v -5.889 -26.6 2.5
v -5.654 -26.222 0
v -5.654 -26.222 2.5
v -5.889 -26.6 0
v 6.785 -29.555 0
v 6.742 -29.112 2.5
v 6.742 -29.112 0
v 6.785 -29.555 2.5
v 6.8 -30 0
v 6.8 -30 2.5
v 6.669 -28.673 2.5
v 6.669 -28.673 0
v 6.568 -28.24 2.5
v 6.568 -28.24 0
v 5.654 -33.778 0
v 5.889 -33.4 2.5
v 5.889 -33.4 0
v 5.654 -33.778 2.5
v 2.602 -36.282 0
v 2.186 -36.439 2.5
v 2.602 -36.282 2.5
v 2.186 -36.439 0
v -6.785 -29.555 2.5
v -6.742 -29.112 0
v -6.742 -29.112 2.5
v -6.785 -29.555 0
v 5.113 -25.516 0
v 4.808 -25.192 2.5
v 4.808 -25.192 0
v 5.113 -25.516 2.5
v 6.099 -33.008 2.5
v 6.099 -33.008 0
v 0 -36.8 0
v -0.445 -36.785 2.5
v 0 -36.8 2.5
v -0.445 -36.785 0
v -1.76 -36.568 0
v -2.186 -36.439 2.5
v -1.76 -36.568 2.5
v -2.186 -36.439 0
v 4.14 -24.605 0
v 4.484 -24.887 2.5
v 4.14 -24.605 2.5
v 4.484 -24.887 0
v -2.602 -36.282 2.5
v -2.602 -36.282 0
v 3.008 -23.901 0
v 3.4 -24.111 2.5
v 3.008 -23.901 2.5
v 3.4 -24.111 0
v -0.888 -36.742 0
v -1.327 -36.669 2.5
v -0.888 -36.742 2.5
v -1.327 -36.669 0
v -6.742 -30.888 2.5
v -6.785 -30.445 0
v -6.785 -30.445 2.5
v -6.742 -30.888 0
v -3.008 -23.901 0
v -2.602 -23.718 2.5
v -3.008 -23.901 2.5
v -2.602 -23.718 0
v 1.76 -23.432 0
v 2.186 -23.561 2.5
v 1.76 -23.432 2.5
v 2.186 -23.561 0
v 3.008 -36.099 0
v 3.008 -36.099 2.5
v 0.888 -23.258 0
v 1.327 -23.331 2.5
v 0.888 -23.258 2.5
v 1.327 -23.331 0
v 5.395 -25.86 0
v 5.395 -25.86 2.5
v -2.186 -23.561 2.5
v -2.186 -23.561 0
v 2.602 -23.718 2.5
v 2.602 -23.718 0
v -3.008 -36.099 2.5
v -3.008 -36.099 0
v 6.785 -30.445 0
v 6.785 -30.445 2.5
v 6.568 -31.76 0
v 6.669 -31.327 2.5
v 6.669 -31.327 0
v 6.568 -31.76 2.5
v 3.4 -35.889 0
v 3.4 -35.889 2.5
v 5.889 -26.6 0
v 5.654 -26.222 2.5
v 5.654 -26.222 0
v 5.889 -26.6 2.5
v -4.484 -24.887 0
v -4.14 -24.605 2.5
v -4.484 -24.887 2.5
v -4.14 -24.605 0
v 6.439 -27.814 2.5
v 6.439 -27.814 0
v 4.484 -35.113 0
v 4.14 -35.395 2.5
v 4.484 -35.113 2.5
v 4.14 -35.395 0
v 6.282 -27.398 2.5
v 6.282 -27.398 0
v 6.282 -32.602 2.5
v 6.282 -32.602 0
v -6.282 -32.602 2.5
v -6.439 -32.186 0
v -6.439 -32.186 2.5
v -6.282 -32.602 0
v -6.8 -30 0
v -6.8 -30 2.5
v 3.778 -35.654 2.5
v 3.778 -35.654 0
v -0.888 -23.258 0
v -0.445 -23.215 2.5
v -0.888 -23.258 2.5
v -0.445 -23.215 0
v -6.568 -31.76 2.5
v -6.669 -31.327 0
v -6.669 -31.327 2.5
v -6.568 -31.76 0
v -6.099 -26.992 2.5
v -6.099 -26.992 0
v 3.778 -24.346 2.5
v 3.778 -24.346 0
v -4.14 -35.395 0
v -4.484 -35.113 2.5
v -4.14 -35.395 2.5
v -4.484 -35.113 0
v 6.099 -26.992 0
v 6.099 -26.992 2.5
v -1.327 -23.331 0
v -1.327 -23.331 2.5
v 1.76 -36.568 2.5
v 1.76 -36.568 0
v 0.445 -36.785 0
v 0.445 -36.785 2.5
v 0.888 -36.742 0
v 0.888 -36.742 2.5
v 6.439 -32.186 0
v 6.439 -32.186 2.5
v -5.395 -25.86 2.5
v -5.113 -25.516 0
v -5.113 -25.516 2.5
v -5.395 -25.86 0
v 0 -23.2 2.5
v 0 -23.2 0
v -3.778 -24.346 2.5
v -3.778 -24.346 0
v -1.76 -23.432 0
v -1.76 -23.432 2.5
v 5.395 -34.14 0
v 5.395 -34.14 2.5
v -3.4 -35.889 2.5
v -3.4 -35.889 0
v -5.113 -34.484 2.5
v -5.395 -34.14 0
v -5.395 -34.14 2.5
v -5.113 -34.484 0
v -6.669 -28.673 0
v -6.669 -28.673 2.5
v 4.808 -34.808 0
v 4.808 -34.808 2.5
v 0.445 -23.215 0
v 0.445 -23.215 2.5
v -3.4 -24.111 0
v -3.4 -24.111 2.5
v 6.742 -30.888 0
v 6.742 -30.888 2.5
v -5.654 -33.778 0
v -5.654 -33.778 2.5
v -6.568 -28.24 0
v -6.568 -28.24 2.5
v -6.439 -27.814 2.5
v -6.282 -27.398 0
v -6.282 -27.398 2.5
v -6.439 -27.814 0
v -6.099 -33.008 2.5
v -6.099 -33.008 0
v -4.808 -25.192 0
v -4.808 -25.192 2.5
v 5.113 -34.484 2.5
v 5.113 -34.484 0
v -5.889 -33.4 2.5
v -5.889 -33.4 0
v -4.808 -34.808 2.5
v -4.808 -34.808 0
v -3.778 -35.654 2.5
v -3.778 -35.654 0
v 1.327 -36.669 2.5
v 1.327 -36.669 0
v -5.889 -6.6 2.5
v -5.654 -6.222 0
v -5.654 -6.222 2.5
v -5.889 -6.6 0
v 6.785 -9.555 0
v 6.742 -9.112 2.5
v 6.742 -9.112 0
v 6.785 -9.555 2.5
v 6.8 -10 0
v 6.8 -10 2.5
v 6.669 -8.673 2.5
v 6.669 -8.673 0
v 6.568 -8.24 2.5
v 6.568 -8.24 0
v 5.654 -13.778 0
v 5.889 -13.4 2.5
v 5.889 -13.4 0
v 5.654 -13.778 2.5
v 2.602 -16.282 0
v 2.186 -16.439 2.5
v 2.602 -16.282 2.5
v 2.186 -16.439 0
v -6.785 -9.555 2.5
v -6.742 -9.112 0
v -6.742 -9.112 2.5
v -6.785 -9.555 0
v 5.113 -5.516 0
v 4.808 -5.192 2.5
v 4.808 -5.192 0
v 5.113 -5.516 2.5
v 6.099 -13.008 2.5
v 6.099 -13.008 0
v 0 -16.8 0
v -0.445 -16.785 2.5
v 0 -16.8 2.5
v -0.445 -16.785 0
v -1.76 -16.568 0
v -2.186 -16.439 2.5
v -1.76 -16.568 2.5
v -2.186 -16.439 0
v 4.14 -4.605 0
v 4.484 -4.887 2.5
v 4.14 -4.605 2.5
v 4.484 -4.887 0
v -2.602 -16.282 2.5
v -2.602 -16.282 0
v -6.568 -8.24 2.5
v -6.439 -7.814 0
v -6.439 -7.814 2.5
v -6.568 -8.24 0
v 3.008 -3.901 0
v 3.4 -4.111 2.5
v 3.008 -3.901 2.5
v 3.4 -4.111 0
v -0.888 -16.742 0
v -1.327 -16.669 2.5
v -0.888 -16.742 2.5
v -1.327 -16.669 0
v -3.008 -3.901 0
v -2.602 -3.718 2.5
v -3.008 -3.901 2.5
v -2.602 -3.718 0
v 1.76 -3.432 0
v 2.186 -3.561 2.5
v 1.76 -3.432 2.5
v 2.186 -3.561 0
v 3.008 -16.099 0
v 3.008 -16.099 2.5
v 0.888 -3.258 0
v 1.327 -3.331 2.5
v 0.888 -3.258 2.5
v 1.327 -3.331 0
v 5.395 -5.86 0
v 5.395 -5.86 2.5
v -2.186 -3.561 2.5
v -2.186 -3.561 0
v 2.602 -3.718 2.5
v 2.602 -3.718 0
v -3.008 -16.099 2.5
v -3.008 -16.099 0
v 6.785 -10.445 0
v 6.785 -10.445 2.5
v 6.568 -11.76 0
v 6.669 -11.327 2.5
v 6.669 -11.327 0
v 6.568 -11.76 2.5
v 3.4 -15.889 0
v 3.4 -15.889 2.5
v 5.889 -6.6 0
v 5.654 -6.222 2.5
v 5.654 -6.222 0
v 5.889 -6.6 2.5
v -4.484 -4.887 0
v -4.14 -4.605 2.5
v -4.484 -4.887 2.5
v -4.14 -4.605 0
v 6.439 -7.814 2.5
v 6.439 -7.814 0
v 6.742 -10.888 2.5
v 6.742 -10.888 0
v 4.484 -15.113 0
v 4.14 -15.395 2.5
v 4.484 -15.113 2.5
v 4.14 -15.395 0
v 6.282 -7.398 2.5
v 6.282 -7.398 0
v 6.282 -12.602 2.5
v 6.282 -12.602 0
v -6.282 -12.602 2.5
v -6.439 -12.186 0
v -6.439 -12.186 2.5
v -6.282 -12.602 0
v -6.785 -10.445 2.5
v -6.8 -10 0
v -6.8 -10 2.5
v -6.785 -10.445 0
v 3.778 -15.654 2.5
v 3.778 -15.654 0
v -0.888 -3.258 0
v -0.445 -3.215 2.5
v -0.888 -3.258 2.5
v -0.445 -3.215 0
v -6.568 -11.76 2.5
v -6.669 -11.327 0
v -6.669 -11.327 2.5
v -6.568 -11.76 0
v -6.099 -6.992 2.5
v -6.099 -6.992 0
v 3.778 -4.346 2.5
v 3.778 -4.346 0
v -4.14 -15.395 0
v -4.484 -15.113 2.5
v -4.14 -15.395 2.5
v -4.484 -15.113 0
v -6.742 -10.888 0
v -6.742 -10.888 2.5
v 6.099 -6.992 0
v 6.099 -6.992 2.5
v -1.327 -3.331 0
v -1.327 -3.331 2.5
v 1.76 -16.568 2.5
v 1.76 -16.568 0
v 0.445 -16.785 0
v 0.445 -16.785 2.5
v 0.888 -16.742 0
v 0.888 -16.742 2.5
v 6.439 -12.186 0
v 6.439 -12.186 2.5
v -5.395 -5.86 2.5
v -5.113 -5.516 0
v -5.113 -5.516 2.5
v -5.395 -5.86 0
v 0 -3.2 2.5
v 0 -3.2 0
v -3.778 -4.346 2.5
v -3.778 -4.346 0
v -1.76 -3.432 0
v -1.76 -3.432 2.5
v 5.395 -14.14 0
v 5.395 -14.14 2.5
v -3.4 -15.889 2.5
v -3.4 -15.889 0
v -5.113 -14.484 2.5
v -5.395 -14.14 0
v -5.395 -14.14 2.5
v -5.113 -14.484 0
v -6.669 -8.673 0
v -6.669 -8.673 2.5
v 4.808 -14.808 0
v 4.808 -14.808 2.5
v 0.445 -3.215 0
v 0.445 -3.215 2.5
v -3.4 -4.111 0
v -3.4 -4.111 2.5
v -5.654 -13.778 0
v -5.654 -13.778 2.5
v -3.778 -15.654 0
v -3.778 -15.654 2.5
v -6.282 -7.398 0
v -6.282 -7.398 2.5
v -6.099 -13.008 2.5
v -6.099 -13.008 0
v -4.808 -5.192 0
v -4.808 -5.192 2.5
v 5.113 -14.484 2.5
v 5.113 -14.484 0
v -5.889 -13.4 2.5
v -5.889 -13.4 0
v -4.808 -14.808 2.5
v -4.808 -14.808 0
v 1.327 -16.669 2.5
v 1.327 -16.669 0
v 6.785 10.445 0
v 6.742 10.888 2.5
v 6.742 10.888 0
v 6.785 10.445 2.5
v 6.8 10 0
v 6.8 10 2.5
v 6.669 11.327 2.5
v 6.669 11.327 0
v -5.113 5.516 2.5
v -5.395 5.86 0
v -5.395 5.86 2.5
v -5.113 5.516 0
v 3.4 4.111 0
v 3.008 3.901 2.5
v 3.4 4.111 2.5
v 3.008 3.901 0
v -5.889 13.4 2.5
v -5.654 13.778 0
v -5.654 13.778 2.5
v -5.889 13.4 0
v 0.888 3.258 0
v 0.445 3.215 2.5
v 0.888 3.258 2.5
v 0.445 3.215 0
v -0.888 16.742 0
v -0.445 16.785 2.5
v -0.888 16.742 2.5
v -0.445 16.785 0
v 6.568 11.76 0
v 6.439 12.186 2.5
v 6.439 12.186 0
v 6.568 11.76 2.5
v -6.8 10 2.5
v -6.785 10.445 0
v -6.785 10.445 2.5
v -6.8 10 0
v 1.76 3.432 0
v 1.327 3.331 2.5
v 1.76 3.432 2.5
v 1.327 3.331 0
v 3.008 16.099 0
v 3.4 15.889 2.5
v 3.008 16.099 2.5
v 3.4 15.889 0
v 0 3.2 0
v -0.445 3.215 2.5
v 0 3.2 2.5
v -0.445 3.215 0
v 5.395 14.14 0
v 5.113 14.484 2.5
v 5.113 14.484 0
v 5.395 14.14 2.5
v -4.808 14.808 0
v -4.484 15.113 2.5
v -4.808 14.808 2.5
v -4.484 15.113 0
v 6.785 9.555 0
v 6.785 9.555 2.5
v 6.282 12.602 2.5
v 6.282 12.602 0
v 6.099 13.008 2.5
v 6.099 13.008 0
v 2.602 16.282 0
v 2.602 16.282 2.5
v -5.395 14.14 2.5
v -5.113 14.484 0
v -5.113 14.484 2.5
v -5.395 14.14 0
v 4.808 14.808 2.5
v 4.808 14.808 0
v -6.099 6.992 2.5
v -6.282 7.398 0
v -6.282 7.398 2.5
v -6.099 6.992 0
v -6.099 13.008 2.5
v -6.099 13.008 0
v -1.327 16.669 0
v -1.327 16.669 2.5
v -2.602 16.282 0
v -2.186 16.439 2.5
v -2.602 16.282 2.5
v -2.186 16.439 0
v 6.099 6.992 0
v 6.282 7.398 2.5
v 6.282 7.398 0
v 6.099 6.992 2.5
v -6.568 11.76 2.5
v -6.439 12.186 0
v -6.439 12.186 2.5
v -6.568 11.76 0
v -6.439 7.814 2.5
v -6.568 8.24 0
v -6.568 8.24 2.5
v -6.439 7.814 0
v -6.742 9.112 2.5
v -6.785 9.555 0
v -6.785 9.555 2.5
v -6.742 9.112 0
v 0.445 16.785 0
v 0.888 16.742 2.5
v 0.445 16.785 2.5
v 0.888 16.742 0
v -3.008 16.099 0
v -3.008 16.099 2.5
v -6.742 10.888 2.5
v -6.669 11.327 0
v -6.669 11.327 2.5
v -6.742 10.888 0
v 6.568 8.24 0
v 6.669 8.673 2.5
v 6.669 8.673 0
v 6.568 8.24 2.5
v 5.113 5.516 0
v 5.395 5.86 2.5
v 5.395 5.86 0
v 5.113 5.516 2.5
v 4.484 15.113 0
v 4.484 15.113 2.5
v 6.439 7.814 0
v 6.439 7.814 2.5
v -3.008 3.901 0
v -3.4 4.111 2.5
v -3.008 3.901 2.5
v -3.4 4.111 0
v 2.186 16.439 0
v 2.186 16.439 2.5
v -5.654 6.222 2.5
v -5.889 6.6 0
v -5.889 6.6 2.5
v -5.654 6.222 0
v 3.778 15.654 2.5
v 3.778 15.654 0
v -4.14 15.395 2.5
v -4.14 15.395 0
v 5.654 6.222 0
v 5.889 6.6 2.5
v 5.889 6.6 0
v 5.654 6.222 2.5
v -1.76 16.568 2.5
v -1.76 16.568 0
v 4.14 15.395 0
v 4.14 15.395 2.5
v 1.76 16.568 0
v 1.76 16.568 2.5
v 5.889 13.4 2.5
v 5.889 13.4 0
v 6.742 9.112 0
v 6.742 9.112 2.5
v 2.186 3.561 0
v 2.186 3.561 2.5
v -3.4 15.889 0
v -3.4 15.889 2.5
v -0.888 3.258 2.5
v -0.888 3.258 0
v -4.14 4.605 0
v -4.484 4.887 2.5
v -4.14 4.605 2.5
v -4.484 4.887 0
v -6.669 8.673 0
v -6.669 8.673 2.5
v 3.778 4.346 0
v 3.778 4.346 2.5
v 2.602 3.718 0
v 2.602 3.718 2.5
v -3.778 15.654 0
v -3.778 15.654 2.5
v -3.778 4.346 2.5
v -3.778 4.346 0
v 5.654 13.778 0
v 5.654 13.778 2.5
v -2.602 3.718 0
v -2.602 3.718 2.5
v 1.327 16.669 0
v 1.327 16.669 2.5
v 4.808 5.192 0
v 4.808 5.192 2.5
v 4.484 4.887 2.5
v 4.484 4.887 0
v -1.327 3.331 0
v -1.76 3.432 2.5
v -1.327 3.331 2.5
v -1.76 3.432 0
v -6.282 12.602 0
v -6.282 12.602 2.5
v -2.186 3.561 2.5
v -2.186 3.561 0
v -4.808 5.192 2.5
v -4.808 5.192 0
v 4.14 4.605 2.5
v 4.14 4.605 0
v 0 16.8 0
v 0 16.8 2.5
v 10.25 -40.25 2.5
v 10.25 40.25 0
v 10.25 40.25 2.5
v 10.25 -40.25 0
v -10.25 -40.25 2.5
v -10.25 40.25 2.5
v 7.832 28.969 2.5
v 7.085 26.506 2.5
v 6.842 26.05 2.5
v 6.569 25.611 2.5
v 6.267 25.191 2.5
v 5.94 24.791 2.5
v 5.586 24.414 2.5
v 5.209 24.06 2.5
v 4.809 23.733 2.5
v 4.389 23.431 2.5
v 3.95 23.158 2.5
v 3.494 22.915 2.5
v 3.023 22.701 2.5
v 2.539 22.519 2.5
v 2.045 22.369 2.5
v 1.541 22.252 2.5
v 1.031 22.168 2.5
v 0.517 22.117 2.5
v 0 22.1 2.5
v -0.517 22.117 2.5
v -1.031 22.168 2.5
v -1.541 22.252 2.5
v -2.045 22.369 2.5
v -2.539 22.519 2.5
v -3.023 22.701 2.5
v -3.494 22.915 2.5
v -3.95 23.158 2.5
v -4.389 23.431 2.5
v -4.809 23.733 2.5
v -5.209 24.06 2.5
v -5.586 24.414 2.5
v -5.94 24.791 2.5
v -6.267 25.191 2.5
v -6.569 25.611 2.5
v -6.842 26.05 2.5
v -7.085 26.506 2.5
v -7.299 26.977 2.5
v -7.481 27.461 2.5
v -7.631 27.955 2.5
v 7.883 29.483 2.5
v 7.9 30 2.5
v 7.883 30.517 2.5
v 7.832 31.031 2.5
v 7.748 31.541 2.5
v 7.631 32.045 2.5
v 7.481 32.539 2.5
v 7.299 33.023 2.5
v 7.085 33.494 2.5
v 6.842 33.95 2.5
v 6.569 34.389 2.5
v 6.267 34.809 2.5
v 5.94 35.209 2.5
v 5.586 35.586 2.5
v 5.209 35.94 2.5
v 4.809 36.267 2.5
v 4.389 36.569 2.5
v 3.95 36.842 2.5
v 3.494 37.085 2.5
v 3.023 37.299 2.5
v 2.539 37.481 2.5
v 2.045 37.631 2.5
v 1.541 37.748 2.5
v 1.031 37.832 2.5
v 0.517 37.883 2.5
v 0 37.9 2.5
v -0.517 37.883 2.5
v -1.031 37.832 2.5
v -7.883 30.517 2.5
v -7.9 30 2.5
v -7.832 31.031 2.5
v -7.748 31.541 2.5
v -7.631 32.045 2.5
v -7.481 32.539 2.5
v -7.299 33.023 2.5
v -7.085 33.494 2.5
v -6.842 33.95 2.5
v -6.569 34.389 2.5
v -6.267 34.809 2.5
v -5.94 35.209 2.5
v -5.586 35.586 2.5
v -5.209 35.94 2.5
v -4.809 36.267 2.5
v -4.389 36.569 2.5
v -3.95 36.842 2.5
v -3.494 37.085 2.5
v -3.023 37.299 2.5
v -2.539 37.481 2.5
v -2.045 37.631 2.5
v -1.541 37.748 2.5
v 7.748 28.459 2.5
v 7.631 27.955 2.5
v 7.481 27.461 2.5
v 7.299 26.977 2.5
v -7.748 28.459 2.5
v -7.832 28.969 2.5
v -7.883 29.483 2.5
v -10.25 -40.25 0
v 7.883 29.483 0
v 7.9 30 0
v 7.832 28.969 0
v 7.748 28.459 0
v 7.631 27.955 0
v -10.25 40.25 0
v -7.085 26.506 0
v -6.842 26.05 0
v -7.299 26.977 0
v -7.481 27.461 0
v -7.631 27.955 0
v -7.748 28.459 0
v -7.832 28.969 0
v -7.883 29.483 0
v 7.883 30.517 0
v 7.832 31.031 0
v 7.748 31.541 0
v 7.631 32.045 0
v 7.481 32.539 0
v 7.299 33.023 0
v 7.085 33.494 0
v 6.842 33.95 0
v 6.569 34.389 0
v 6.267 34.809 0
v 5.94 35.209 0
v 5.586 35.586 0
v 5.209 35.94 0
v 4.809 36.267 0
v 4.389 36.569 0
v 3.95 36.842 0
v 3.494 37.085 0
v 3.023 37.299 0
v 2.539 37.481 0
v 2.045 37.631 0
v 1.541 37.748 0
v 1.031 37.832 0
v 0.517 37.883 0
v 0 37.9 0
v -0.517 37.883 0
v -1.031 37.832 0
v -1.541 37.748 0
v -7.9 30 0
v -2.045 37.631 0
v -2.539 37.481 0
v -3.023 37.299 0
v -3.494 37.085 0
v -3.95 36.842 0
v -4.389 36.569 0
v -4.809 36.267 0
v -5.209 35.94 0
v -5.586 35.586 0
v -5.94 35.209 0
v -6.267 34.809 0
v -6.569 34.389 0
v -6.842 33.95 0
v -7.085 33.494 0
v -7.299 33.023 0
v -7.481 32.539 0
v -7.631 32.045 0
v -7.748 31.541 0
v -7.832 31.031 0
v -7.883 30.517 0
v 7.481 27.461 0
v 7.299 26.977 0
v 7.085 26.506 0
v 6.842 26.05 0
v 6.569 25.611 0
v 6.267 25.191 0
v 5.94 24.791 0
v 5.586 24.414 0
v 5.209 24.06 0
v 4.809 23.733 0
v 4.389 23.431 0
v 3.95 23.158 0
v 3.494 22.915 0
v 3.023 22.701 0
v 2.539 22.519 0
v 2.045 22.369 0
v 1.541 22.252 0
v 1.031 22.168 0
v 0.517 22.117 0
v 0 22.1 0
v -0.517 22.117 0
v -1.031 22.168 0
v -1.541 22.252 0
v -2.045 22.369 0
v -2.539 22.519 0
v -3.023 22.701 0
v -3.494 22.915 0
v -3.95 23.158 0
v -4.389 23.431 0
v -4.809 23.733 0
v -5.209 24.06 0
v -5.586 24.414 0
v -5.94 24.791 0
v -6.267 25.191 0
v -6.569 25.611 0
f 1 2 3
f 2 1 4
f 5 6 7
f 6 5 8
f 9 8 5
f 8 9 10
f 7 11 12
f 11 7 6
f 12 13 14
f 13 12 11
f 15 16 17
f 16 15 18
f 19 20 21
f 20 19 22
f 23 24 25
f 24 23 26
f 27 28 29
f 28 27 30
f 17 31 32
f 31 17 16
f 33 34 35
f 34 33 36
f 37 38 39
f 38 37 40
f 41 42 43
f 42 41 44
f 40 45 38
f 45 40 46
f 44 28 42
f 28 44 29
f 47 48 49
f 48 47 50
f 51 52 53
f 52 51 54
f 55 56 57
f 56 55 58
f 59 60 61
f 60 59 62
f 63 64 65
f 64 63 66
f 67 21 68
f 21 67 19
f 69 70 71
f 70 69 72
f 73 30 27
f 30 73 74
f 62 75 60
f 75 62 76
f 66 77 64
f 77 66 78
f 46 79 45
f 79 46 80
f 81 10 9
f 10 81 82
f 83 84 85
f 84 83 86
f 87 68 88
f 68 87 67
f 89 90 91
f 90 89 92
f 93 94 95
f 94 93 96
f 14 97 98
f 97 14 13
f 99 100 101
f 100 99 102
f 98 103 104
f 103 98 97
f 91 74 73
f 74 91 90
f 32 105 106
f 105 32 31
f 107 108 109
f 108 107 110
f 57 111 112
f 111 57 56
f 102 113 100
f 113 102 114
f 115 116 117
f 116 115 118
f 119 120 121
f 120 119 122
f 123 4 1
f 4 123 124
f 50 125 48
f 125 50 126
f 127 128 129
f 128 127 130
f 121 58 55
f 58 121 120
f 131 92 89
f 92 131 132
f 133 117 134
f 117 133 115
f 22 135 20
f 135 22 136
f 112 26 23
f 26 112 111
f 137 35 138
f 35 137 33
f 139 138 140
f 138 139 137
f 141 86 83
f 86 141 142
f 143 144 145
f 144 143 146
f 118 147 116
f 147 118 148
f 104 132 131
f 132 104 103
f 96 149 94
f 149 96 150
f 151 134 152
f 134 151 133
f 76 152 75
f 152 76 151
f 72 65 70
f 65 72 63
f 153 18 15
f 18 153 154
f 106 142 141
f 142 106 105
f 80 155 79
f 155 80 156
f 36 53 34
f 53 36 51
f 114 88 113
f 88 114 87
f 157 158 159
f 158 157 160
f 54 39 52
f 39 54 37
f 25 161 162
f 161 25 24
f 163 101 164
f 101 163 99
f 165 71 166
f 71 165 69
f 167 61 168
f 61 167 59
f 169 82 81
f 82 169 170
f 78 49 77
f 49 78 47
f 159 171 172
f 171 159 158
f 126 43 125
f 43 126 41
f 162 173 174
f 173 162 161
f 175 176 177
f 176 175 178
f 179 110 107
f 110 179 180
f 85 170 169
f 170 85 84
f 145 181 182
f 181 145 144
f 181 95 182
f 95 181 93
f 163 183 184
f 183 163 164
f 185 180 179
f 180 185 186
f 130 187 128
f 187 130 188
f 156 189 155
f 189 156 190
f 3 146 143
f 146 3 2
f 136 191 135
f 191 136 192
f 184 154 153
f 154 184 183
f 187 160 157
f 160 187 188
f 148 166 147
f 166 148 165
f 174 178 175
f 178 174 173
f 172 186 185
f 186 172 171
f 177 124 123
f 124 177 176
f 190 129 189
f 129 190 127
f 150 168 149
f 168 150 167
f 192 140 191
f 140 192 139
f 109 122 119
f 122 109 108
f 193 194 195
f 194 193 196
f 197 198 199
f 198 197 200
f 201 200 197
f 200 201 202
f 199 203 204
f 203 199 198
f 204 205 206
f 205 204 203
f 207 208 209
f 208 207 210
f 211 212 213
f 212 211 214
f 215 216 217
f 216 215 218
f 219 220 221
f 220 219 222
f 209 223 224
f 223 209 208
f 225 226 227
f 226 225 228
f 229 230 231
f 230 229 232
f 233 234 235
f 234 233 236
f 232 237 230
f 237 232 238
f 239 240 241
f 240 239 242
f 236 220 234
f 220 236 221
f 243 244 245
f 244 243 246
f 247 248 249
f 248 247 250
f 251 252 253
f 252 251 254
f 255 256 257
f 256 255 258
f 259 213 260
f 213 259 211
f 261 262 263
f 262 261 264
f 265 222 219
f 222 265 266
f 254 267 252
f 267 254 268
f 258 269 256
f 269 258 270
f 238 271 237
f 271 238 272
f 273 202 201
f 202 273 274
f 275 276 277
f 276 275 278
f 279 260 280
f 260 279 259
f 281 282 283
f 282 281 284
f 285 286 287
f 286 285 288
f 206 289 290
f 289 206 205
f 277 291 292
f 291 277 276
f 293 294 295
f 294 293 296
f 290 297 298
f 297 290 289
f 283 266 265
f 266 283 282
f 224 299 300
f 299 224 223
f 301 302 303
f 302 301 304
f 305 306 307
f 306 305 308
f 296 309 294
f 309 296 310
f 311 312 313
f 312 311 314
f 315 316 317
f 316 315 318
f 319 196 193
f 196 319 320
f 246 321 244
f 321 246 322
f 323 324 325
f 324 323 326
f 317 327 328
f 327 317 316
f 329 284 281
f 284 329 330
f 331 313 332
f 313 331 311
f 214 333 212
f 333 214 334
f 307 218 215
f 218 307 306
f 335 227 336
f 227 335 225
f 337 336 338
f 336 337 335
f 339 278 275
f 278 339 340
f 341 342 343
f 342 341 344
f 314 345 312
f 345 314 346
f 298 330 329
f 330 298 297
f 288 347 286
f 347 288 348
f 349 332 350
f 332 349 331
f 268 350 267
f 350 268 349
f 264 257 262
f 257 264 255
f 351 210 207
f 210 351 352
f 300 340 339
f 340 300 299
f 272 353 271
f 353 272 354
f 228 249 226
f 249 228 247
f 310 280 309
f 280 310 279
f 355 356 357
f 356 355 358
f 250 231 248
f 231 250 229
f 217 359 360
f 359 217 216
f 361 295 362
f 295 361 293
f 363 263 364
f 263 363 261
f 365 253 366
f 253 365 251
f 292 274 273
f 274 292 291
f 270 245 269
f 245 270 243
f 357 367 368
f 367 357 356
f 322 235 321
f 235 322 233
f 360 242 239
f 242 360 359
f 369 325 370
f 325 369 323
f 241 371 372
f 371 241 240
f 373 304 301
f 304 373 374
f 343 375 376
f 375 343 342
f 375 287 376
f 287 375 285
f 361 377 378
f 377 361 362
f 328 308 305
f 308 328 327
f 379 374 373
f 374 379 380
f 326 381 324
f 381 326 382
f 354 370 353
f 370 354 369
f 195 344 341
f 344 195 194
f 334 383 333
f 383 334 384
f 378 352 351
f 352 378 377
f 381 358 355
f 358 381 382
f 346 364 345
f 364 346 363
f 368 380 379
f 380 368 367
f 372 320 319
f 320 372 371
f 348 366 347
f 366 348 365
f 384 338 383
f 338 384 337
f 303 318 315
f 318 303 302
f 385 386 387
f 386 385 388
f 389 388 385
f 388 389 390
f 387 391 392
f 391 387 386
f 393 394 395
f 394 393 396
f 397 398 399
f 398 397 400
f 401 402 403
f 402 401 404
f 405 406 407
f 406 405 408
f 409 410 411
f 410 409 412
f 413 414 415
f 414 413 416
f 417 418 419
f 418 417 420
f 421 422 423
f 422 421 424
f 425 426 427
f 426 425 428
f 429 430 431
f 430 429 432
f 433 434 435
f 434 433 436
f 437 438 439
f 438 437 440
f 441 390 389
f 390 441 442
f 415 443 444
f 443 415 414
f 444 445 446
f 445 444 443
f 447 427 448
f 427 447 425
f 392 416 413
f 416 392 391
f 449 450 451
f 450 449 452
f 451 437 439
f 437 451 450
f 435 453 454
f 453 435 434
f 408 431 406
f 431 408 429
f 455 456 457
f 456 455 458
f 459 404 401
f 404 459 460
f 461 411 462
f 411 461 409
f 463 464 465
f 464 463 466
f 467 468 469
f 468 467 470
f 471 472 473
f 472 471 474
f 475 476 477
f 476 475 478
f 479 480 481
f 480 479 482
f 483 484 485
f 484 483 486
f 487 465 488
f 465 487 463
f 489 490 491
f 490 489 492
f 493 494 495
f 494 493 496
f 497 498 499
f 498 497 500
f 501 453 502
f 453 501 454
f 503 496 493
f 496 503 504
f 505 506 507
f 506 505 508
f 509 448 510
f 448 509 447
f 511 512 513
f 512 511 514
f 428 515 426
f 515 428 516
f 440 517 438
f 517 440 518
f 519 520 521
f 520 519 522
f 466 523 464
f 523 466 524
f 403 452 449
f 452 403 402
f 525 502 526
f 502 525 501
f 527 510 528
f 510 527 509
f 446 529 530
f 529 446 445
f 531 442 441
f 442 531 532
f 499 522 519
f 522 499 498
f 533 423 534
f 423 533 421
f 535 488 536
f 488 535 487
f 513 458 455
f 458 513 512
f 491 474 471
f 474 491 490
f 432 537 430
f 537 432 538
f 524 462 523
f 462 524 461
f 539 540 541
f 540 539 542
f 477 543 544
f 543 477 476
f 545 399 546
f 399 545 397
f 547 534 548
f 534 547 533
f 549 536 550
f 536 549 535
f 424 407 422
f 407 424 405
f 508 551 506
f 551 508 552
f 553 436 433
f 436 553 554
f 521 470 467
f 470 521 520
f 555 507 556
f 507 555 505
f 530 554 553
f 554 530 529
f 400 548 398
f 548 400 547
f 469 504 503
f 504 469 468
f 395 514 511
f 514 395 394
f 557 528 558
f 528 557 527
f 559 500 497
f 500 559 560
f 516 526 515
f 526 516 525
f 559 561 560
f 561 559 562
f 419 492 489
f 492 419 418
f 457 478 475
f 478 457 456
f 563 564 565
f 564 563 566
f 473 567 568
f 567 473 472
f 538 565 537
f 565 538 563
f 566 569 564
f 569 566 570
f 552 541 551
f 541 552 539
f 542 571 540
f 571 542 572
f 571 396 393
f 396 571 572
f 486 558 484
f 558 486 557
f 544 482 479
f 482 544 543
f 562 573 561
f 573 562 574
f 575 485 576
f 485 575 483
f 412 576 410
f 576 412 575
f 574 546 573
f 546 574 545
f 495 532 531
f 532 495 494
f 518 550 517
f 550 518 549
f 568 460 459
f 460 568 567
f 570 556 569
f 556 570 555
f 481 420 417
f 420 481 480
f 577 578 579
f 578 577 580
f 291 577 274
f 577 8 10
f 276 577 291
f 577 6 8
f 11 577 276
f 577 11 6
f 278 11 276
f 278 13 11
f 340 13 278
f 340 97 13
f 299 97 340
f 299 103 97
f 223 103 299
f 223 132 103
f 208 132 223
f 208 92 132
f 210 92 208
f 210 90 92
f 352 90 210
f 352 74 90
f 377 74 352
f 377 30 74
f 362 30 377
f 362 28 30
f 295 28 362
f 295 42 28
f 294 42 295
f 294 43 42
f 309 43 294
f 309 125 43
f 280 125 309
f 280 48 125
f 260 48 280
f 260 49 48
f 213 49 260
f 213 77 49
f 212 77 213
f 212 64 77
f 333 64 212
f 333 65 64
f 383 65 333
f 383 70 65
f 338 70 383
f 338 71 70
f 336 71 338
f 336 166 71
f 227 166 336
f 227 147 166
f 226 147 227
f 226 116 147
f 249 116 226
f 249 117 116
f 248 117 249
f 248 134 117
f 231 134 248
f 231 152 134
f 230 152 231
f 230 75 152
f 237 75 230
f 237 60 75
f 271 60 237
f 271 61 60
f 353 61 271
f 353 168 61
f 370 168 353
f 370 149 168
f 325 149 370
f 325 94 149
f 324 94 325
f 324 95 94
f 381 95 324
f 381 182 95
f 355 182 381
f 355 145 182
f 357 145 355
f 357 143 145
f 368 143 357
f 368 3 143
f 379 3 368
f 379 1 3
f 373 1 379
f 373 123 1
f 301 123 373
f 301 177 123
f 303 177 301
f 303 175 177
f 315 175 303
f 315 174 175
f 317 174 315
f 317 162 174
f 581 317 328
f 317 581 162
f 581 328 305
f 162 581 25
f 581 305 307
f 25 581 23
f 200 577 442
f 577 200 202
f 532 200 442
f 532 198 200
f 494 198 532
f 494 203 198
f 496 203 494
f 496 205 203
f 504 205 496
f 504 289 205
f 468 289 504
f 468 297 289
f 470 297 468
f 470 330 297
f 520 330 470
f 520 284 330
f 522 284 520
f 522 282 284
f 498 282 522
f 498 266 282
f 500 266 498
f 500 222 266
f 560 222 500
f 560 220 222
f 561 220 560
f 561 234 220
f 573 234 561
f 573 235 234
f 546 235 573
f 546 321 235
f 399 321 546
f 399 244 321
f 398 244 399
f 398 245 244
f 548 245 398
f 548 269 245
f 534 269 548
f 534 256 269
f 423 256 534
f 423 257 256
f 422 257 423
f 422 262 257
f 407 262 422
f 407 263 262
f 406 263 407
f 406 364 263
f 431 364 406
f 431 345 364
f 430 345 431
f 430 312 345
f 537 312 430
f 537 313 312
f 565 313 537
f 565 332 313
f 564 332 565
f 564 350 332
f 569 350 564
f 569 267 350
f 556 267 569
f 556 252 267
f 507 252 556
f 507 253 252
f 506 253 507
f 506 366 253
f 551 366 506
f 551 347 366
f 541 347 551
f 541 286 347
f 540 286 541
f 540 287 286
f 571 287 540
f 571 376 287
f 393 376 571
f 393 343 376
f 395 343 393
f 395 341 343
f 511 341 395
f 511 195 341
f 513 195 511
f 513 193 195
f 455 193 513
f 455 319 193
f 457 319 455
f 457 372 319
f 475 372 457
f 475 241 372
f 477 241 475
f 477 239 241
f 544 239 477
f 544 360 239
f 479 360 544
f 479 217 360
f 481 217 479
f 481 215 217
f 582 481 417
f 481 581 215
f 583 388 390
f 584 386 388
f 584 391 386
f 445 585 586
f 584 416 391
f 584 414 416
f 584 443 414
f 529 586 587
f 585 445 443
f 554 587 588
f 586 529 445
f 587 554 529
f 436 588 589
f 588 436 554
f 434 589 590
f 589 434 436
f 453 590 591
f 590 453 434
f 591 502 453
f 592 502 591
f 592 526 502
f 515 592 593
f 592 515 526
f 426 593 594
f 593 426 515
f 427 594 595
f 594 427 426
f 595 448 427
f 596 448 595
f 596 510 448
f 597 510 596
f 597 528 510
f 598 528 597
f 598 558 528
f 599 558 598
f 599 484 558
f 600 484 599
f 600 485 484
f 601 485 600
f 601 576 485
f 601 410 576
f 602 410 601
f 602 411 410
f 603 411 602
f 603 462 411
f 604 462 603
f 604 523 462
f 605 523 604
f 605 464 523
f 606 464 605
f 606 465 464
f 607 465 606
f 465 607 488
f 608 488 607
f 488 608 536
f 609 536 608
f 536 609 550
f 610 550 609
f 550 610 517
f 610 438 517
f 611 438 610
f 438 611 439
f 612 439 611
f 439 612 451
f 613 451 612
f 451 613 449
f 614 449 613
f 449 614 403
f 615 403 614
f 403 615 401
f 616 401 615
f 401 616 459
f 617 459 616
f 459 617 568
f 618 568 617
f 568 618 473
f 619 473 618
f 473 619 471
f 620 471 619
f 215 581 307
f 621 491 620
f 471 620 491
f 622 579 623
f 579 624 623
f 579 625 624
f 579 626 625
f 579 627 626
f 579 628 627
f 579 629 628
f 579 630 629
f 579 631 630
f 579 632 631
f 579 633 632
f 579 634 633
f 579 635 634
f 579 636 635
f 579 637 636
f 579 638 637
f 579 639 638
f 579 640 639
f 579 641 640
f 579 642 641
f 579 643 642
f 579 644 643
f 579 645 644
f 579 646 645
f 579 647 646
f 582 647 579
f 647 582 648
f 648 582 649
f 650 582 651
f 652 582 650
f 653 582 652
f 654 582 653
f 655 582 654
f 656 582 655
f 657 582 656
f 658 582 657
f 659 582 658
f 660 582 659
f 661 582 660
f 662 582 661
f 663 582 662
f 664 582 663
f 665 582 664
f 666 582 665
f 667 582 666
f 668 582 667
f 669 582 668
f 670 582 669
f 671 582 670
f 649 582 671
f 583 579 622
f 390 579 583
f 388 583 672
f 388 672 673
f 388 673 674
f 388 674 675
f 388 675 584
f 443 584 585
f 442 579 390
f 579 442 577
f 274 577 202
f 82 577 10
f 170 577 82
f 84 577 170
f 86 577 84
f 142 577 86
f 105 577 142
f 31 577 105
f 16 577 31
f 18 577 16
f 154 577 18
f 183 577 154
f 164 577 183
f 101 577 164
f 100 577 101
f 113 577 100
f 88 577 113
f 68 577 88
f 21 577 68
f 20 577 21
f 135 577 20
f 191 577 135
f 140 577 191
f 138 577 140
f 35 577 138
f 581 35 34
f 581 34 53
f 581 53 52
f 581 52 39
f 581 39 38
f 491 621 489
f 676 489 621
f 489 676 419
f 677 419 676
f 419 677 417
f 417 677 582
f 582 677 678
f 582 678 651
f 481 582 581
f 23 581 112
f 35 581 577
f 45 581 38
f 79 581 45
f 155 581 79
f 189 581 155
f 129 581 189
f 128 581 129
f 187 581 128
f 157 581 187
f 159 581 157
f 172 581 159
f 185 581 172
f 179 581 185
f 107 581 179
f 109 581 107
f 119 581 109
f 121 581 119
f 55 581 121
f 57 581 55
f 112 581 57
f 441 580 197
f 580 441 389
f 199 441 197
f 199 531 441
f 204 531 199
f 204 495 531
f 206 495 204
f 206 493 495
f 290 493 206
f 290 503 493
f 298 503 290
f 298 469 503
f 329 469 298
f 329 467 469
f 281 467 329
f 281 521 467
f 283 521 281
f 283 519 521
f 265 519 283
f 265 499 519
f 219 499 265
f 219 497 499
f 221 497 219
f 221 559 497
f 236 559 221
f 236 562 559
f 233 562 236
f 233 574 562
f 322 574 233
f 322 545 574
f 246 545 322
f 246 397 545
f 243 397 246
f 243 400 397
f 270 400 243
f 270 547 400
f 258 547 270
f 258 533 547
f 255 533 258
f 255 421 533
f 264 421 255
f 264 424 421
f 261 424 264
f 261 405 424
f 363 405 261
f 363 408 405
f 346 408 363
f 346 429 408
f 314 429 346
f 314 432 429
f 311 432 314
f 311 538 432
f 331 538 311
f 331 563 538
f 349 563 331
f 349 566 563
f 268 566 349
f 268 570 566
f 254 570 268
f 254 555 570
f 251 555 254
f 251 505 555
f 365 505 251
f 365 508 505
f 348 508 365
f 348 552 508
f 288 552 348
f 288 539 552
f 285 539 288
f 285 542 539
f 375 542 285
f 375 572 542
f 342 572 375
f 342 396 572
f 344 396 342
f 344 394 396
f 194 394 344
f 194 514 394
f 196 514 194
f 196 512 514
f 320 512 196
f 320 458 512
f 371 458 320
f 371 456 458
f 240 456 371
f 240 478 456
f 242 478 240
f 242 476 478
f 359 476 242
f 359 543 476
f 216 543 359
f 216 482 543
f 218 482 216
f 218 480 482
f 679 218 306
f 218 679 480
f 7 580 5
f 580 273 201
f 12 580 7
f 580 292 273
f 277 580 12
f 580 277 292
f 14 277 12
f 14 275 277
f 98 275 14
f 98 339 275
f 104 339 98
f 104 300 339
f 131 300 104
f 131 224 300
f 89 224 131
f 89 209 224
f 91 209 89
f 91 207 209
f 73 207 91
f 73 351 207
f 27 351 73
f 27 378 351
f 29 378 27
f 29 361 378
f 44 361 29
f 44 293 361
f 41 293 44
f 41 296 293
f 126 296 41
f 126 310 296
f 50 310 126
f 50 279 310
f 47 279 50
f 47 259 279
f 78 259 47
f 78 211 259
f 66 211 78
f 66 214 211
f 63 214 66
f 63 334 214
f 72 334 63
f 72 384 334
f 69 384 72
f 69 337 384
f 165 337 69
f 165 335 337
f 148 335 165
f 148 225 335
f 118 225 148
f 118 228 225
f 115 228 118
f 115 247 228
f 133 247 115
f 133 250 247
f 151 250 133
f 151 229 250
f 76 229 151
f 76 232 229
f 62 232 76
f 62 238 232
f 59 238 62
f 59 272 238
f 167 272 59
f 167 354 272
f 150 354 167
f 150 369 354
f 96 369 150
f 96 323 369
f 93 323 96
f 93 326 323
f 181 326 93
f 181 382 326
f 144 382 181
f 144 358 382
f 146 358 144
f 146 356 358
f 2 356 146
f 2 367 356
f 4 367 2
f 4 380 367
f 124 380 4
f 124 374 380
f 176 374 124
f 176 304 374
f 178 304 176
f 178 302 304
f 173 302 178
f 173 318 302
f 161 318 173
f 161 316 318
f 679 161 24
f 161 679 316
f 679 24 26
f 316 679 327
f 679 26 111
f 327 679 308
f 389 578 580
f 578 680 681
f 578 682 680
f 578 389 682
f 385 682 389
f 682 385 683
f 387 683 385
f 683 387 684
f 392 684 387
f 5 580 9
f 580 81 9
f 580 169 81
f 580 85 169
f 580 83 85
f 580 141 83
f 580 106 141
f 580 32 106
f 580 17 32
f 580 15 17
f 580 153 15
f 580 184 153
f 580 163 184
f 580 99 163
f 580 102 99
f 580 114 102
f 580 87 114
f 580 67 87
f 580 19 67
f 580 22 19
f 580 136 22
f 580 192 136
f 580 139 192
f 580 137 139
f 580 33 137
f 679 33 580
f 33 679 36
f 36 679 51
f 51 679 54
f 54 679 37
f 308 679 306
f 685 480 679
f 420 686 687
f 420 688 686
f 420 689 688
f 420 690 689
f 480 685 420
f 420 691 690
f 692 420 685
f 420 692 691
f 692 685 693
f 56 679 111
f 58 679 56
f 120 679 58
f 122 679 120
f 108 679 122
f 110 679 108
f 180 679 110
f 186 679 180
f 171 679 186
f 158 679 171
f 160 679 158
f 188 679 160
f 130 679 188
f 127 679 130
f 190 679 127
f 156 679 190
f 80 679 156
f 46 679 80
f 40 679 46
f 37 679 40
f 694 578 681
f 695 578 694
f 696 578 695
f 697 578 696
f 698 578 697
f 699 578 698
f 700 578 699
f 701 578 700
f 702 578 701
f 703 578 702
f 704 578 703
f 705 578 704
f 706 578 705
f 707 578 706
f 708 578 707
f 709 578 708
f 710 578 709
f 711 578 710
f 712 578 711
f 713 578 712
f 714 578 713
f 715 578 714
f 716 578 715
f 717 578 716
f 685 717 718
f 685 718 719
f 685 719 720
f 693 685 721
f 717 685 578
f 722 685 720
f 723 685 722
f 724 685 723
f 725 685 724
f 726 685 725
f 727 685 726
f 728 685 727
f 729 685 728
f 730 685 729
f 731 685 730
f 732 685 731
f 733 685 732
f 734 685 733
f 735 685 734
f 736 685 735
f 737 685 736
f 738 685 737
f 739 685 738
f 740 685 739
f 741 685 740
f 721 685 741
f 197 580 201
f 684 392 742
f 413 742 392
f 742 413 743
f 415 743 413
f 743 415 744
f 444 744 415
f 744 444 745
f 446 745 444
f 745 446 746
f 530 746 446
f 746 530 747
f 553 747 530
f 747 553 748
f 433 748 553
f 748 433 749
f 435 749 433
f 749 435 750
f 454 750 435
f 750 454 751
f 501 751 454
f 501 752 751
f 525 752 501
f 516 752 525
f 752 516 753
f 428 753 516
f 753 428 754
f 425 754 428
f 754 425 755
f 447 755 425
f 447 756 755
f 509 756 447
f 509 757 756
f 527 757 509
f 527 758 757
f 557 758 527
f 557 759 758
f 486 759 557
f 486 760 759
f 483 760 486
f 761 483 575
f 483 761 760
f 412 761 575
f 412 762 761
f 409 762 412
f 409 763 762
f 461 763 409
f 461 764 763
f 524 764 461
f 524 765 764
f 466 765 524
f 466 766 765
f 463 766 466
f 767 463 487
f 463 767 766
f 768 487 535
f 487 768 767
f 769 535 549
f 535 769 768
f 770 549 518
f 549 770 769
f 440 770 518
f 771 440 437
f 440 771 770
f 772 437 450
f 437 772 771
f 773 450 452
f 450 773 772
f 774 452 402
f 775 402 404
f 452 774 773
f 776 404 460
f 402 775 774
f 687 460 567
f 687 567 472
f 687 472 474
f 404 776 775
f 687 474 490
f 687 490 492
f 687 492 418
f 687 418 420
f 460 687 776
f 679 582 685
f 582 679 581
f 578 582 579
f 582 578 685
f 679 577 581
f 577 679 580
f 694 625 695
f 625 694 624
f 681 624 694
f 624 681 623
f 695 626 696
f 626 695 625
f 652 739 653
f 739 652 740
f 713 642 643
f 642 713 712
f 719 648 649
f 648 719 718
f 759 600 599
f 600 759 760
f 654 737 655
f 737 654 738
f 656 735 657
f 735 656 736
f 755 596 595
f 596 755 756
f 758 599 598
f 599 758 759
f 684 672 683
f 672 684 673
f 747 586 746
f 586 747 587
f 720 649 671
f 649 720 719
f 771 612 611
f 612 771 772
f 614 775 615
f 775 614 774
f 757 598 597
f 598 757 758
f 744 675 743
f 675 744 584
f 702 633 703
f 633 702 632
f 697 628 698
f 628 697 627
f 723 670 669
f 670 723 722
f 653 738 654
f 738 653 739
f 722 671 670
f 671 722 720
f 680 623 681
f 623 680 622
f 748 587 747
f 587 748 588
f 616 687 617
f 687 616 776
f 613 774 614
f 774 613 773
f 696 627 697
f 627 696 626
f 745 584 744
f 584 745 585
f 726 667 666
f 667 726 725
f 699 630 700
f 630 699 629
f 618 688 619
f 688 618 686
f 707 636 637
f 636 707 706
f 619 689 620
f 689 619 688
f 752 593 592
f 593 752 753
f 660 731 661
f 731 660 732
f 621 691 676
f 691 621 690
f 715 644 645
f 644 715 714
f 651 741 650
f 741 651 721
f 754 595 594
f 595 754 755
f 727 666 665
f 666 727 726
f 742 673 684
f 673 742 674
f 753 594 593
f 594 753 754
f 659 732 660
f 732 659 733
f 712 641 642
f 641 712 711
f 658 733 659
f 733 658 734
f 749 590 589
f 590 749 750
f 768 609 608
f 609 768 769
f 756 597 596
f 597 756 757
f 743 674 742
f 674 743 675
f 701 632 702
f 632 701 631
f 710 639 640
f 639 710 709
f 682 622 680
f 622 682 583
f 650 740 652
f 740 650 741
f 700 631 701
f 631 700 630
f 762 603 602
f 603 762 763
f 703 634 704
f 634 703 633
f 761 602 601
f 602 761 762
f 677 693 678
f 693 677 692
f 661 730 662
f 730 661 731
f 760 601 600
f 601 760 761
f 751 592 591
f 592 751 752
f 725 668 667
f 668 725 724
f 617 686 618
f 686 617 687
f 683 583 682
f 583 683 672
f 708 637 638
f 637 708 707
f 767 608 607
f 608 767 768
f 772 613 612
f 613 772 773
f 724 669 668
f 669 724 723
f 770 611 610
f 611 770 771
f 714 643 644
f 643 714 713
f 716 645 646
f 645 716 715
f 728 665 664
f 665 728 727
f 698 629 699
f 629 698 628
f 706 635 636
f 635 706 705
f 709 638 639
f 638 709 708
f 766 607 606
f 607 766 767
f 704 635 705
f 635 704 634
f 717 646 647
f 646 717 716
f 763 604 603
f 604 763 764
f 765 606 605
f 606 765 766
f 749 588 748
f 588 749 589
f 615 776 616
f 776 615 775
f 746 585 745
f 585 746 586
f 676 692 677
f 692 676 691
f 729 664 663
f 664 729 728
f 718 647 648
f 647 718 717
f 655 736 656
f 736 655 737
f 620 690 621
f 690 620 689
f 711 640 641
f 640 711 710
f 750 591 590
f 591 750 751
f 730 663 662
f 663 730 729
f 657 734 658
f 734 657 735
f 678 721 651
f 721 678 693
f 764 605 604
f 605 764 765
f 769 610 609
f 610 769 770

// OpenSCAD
// Open Rally Remote — button + joystick carrier, V0.2
// Based on APEM IS reduced-bezel buttons and Ruffy MHS joystick dimensions.
// The joystick's full profiled panel opening needs drawing/sample verification;
// this model shows the published Ø0.622 in (15.80 mm) nominal opening only.

$fn = 96;

button_cutout_diameter = 13.6;
button_bezel_diameter = 15.0; // APEM IS reduced-bezel option
button_pitch = 20.0;
panel_thickness = 2.5;        // APEM 1.5–4 mm; Ruffy MHS 2–3 mm
button_edge_margin = 2.75;    // derived from 20.5 mm width and 15 mm bezel
joystick_opening_diameter = 15.80; // Ruffy drawing: Ø0.622 in
control_pitch = 20.0;

button_count = 3;
control_count = button_count + 1;
panel_width = 20.5;
panel_length = button_bezel_diameter + 2 * button_edge_margin
             + control_pitch * (control_count - 1);

difference() {
    // Outline: 20.5 × 80.5 × 2.5 mm.
    translate([0, 0, panel_thickness / 2])
        cube([panel_width, panel_length, panel_thickness], center=true);

    // Buttons A, B, C. The lower joystick occupies the fourth control position.
    for (i = [0 : button_count - 1]) {
        y = -panel_length / 2 + button_edge_margin + button_bezel_diameter / 2
          + i * control_pitch;
        translate([0, y, -0.1])
            cylinder(d=button_cutout_diameter, h=panel_thickness + 0.2);
    }

    // Joystick mounting opening, centered 20 mm below button C.
    // See file header and mechanical guide: the manufacturer's drawing also
    // shows a 0.291 in profile detail not represented by this round opening.
    joystick_y = -panel_length / 2 + button_edge_margin + button_bezel_diameter / 2
               + button_count * control_pitch;
    translate([0, joystick_y, -0.1])
        cylinder(d=joystick_opening_diameter, h=panel_thickness + 0.2);
}
